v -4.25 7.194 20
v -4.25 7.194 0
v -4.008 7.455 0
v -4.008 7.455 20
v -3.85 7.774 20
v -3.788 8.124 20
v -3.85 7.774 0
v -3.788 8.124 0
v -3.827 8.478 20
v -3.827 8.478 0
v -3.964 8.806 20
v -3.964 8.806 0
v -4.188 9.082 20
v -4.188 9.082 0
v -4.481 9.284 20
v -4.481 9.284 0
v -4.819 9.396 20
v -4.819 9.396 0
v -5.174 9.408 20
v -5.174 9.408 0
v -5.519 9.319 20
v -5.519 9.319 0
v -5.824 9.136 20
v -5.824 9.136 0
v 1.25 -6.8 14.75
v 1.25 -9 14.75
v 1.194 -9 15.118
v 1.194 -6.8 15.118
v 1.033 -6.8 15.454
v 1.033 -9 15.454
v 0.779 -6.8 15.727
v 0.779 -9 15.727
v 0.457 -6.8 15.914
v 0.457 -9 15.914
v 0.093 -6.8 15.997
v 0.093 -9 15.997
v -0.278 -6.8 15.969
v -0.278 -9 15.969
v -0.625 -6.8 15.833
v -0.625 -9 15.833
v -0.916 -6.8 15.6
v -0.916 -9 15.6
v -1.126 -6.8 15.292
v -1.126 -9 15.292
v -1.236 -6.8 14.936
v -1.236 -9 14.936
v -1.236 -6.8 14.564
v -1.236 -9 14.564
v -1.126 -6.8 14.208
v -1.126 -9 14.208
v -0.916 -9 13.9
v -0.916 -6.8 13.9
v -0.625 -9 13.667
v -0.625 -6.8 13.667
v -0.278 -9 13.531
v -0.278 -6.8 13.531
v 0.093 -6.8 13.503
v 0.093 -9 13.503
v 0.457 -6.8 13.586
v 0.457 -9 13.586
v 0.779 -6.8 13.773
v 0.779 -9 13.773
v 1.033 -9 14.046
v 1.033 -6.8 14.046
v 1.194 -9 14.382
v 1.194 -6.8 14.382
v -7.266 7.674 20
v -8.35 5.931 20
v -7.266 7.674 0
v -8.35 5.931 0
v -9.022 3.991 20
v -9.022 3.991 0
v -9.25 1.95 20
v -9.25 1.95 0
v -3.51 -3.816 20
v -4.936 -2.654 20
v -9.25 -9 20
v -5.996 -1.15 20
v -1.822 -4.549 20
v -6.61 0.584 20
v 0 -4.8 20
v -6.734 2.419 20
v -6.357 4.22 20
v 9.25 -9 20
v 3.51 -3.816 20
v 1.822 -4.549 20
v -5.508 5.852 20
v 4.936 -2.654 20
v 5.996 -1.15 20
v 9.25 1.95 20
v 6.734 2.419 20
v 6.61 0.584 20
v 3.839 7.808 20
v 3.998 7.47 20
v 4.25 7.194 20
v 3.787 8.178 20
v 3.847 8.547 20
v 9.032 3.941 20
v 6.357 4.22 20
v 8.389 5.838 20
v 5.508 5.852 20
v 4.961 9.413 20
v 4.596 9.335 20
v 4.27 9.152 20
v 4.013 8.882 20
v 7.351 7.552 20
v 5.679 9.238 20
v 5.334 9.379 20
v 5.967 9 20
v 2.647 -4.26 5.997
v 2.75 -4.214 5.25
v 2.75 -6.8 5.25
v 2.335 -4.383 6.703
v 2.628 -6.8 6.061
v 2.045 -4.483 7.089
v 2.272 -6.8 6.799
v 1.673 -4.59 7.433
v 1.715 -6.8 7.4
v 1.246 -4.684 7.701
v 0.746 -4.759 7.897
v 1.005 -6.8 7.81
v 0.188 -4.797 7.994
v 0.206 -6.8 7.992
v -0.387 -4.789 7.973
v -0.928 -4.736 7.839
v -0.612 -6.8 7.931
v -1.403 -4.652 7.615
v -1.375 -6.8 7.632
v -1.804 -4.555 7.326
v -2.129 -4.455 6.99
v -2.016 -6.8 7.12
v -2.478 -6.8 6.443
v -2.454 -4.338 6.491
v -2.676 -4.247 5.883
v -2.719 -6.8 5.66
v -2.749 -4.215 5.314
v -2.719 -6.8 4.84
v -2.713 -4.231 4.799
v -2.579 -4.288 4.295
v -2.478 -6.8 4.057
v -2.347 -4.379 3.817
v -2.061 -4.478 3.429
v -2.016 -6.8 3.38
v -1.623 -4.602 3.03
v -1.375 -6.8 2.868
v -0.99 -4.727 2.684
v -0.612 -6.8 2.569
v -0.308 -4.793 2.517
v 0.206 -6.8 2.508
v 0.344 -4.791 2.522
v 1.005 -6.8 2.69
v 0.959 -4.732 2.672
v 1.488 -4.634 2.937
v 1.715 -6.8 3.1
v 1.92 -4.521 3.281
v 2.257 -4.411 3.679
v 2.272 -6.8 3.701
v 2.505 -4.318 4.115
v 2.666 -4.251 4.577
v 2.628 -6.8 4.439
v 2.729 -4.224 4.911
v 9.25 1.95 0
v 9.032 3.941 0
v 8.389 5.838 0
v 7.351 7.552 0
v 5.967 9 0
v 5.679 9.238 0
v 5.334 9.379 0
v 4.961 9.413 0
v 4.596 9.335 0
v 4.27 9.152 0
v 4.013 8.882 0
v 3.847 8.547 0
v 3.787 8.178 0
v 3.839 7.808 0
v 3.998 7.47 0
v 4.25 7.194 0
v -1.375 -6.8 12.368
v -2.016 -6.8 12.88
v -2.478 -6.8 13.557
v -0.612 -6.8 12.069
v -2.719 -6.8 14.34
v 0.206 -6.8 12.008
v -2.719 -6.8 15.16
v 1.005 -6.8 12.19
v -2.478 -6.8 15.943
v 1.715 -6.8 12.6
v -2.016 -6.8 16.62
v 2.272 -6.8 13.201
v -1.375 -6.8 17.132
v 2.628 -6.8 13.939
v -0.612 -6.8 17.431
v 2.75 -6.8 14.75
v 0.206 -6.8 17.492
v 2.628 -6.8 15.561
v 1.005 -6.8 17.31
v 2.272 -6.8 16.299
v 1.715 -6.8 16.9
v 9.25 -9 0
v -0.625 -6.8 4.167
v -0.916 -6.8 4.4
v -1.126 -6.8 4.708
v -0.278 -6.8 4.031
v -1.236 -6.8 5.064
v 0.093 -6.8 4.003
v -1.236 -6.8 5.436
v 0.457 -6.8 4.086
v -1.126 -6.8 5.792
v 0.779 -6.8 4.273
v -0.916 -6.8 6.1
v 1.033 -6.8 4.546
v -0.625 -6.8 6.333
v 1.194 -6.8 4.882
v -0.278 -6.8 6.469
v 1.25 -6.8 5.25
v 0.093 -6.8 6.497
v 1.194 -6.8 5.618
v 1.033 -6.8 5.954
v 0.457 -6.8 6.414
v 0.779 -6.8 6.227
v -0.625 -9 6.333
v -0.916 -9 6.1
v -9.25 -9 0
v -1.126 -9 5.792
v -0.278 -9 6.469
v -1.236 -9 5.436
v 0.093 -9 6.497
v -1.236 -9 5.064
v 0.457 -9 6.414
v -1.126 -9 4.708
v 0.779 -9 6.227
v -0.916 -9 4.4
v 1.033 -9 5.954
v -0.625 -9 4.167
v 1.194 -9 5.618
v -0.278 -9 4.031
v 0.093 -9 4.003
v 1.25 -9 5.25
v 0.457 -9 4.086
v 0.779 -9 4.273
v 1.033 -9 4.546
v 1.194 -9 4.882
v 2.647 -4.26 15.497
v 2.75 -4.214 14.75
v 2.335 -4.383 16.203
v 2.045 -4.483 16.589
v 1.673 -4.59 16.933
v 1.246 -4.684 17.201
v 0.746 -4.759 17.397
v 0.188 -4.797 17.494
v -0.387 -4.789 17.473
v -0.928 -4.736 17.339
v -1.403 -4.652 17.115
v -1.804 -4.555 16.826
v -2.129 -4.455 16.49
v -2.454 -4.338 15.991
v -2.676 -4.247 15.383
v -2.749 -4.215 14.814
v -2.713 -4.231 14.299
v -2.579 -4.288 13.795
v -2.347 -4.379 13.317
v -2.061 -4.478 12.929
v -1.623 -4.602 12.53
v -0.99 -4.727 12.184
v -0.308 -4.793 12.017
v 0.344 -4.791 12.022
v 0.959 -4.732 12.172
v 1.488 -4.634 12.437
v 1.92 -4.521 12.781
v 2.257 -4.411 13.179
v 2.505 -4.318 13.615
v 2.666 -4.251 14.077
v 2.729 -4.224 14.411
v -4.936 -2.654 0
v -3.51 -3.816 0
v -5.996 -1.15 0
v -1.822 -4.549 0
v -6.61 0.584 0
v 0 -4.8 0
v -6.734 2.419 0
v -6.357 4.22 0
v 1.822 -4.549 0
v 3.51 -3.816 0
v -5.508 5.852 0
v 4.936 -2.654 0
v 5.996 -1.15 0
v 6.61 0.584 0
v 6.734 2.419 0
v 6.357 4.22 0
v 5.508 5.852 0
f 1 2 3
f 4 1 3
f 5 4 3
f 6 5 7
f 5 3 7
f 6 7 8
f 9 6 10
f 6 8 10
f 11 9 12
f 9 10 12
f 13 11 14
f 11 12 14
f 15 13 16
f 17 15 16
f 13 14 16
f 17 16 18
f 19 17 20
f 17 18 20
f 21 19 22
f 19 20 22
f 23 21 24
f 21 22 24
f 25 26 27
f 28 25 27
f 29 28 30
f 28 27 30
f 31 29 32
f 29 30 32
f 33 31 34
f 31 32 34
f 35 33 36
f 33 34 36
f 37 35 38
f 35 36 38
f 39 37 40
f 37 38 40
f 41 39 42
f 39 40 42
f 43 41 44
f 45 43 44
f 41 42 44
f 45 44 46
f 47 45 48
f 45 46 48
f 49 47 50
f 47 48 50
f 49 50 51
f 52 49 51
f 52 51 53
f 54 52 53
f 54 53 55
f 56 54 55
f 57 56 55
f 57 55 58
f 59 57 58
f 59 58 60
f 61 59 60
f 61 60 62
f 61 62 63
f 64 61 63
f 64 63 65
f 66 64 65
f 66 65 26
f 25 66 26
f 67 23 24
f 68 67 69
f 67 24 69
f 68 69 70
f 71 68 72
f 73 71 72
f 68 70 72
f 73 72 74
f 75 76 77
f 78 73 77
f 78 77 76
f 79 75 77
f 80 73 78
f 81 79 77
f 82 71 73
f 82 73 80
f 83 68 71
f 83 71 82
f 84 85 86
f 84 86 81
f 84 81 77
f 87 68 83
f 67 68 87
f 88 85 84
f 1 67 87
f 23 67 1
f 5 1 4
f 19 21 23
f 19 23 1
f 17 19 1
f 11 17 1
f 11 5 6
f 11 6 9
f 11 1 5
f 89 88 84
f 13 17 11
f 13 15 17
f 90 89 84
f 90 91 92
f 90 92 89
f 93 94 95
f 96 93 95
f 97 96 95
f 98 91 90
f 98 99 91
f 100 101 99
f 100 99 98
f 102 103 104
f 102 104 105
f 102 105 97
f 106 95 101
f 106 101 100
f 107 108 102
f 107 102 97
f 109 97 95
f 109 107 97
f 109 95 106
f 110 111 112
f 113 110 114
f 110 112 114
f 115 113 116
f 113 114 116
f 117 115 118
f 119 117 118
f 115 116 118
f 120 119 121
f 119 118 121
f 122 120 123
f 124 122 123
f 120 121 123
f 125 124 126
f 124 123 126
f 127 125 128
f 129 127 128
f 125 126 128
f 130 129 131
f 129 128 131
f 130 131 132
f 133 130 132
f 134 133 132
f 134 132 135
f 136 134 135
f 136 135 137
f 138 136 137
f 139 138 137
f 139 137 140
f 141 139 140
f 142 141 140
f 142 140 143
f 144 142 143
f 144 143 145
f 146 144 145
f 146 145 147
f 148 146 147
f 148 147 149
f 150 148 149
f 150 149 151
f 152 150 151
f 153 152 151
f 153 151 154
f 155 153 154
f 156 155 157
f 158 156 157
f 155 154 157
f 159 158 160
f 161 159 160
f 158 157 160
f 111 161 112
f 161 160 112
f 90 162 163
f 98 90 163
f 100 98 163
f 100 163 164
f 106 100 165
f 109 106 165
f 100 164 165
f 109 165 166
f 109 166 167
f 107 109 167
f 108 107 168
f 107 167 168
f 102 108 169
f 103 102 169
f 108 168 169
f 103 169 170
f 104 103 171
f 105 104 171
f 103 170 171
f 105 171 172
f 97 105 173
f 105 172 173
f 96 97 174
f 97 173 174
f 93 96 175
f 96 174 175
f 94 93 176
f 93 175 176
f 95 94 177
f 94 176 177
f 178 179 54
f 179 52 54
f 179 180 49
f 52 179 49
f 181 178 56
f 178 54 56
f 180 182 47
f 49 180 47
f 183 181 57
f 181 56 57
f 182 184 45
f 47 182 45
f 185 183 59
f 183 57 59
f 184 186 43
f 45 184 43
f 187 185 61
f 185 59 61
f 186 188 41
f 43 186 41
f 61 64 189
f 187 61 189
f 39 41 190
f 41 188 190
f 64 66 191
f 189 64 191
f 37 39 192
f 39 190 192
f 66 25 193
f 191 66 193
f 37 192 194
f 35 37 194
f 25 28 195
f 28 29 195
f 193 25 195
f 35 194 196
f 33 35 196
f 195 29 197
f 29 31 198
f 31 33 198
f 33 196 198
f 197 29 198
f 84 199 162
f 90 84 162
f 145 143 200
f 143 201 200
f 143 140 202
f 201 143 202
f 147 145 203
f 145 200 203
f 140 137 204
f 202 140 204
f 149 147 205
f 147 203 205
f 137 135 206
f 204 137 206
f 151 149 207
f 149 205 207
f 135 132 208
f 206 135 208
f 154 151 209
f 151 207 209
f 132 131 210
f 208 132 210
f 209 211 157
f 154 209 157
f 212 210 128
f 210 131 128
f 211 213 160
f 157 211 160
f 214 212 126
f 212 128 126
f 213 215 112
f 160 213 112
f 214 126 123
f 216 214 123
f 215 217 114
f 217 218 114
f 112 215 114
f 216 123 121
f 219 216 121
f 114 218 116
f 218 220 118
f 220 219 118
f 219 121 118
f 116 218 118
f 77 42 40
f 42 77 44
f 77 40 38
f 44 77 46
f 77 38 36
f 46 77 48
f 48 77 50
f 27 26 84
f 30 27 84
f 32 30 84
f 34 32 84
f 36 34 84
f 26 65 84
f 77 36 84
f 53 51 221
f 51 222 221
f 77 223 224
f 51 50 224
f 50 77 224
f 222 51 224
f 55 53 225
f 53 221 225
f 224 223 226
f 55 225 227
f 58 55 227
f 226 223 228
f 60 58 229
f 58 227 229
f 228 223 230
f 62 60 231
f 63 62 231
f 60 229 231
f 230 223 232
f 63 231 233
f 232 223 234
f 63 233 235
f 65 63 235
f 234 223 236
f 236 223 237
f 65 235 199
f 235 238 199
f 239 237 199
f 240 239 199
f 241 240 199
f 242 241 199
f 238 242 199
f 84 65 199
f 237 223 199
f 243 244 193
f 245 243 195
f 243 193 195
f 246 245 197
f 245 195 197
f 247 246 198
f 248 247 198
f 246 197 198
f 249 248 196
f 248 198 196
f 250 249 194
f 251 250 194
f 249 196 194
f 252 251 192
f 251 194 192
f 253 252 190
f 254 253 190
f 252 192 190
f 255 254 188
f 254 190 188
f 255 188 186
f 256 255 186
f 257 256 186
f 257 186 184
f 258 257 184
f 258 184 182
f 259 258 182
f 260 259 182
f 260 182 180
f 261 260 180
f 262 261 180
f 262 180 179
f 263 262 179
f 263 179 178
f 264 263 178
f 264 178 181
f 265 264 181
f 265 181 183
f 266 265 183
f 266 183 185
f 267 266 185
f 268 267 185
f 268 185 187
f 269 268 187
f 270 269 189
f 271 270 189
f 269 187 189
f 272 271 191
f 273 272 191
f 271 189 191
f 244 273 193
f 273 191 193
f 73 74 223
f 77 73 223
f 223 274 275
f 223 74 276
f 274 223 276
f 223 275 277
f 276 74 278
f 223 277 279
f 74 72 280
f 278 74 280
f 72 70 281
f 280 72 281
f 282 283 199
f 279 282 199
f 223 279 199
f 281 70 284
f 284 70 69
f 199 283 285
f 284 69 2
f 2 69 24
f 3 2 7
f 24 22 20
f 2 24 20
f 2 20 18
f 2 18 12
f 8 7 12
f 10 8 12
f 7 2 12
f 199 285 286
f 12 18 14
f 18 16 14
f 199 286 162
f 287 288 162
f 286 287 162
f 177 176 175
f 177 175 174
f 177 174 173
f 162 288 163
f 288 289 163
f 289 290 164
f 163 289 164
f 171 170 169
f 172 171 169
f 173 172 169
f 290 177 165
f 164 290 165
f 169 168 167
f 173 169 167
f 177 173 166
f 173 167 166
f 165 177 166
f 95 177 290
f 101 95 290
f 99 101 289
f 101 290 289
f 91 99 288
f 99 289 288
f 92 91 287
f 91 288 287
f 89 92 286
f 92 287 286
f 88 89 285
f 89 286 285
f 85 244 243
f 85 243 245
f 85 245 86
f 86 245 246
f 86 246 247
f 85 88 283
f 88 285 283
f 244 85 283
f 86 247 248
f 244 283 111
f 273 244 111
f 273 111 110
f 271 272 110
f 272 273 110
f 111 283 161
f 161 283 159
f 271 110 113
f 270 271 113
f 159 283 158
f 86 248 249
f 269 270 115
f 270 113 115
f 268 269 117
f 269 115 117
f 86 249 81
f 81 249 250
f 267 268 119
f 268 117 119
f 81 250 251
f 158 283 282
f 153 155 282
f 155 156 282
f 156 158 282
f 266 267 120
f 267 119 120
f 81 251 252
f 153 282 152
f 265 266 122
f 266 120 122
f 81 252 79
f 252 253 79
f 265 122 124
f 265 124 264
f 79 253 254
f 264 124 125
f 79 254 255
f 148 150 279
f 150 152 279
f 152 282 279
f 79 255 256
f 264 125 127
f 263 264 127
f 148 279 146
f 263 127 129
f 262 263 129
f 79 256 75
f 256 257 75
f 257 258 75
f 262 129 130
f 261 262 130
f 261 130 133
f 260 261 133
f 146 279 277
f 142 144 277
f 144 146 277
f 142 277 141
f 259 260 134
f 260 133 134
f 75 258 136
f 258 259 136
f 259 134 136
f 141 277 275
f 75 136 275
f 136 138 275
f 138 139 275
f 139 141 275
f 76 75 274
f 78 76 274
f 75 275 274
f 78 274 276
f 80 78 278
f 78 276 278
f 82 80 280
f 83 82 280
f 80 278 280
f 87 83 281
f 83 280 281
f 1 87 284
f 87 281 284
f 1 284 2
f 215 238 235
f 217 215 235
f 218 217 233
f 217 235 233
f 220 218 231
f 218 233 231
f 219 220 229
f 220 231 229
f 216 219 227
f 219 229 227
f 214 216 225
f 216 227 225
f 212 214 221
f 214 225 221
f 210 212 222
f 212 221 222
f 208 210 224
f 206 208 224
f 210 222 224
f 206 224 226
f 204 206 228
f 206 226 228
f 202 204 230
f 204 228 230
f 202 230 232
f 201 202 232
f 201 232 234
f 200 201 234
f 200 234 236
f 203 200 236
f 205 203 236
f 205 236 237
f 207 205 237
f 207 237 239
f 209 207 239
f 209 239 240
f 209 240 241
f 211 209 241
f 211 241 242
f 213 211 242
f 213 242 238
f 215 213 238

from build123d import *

# Parameters (mm, degrees)
F1_DEPTH = 20
F2_R     = 1.25
F3_DEPTH = 6
F5_R     = 2.75
F6_DEPTH = 5


with BuildPart() as f1:
    # F0 (on Top) → F1 (new body)
    with BuildSketch(Plane.XY):
        with BuildLine():
            Line((-9.25, -9), (9.25, -9))
            Line((9.25, -9), (9.25, 1.95))
            ThreePointArc((9.25, 1.95), (8.3891203434, 5.8383820078), (5.9673854088, 9))
            ThreePointArc((5.9673854088, 9), (4.1312205072, 9.0265556821), (4.25, 7.1940442409))
            ThreePointArc((4.25, 7.1940442409), (0, -4.8), (-4.25, 7.1940442409))
            ThreePointArc((-4.25, 7.1940442409), (-4.0659177332, 8.9522005817), (-5.8240740741, 9.1362828486))
            ThreePointArc((-5.8240740741, 9.1362828486), (-8.3497061381, 5.9305662169), (-9.25, 1.95))
            Line((-9.25, 1.95), (-9.25, -9))
        make_face()
    extrude(amount=F1_DEPTH)

    # F2 (on face) → F3 (cut)
    with BuildSketch(Plane.XZ.offset(9)):
        with Locations((0, 14.75)):
            Circle(F2_R)
        with Locations((0, 5.25)):
            Circle(F2_R)
    extrude(amount=-F3_DEPTH, mode=Mode.SUBTRACT)

    # F5 (on offset) → F6 (cut)
    with BuildSketch(Plane.XZ.offset(6.8)):
        with Locations((0, 14.75)):
            Circle(F5_R)
        with Locations((0, 5.25)):
            Circle(F5_R)
    extrude(amount=-F6_DEPTH, mode=Mode.SUBTRACT)


solid = f1.part
